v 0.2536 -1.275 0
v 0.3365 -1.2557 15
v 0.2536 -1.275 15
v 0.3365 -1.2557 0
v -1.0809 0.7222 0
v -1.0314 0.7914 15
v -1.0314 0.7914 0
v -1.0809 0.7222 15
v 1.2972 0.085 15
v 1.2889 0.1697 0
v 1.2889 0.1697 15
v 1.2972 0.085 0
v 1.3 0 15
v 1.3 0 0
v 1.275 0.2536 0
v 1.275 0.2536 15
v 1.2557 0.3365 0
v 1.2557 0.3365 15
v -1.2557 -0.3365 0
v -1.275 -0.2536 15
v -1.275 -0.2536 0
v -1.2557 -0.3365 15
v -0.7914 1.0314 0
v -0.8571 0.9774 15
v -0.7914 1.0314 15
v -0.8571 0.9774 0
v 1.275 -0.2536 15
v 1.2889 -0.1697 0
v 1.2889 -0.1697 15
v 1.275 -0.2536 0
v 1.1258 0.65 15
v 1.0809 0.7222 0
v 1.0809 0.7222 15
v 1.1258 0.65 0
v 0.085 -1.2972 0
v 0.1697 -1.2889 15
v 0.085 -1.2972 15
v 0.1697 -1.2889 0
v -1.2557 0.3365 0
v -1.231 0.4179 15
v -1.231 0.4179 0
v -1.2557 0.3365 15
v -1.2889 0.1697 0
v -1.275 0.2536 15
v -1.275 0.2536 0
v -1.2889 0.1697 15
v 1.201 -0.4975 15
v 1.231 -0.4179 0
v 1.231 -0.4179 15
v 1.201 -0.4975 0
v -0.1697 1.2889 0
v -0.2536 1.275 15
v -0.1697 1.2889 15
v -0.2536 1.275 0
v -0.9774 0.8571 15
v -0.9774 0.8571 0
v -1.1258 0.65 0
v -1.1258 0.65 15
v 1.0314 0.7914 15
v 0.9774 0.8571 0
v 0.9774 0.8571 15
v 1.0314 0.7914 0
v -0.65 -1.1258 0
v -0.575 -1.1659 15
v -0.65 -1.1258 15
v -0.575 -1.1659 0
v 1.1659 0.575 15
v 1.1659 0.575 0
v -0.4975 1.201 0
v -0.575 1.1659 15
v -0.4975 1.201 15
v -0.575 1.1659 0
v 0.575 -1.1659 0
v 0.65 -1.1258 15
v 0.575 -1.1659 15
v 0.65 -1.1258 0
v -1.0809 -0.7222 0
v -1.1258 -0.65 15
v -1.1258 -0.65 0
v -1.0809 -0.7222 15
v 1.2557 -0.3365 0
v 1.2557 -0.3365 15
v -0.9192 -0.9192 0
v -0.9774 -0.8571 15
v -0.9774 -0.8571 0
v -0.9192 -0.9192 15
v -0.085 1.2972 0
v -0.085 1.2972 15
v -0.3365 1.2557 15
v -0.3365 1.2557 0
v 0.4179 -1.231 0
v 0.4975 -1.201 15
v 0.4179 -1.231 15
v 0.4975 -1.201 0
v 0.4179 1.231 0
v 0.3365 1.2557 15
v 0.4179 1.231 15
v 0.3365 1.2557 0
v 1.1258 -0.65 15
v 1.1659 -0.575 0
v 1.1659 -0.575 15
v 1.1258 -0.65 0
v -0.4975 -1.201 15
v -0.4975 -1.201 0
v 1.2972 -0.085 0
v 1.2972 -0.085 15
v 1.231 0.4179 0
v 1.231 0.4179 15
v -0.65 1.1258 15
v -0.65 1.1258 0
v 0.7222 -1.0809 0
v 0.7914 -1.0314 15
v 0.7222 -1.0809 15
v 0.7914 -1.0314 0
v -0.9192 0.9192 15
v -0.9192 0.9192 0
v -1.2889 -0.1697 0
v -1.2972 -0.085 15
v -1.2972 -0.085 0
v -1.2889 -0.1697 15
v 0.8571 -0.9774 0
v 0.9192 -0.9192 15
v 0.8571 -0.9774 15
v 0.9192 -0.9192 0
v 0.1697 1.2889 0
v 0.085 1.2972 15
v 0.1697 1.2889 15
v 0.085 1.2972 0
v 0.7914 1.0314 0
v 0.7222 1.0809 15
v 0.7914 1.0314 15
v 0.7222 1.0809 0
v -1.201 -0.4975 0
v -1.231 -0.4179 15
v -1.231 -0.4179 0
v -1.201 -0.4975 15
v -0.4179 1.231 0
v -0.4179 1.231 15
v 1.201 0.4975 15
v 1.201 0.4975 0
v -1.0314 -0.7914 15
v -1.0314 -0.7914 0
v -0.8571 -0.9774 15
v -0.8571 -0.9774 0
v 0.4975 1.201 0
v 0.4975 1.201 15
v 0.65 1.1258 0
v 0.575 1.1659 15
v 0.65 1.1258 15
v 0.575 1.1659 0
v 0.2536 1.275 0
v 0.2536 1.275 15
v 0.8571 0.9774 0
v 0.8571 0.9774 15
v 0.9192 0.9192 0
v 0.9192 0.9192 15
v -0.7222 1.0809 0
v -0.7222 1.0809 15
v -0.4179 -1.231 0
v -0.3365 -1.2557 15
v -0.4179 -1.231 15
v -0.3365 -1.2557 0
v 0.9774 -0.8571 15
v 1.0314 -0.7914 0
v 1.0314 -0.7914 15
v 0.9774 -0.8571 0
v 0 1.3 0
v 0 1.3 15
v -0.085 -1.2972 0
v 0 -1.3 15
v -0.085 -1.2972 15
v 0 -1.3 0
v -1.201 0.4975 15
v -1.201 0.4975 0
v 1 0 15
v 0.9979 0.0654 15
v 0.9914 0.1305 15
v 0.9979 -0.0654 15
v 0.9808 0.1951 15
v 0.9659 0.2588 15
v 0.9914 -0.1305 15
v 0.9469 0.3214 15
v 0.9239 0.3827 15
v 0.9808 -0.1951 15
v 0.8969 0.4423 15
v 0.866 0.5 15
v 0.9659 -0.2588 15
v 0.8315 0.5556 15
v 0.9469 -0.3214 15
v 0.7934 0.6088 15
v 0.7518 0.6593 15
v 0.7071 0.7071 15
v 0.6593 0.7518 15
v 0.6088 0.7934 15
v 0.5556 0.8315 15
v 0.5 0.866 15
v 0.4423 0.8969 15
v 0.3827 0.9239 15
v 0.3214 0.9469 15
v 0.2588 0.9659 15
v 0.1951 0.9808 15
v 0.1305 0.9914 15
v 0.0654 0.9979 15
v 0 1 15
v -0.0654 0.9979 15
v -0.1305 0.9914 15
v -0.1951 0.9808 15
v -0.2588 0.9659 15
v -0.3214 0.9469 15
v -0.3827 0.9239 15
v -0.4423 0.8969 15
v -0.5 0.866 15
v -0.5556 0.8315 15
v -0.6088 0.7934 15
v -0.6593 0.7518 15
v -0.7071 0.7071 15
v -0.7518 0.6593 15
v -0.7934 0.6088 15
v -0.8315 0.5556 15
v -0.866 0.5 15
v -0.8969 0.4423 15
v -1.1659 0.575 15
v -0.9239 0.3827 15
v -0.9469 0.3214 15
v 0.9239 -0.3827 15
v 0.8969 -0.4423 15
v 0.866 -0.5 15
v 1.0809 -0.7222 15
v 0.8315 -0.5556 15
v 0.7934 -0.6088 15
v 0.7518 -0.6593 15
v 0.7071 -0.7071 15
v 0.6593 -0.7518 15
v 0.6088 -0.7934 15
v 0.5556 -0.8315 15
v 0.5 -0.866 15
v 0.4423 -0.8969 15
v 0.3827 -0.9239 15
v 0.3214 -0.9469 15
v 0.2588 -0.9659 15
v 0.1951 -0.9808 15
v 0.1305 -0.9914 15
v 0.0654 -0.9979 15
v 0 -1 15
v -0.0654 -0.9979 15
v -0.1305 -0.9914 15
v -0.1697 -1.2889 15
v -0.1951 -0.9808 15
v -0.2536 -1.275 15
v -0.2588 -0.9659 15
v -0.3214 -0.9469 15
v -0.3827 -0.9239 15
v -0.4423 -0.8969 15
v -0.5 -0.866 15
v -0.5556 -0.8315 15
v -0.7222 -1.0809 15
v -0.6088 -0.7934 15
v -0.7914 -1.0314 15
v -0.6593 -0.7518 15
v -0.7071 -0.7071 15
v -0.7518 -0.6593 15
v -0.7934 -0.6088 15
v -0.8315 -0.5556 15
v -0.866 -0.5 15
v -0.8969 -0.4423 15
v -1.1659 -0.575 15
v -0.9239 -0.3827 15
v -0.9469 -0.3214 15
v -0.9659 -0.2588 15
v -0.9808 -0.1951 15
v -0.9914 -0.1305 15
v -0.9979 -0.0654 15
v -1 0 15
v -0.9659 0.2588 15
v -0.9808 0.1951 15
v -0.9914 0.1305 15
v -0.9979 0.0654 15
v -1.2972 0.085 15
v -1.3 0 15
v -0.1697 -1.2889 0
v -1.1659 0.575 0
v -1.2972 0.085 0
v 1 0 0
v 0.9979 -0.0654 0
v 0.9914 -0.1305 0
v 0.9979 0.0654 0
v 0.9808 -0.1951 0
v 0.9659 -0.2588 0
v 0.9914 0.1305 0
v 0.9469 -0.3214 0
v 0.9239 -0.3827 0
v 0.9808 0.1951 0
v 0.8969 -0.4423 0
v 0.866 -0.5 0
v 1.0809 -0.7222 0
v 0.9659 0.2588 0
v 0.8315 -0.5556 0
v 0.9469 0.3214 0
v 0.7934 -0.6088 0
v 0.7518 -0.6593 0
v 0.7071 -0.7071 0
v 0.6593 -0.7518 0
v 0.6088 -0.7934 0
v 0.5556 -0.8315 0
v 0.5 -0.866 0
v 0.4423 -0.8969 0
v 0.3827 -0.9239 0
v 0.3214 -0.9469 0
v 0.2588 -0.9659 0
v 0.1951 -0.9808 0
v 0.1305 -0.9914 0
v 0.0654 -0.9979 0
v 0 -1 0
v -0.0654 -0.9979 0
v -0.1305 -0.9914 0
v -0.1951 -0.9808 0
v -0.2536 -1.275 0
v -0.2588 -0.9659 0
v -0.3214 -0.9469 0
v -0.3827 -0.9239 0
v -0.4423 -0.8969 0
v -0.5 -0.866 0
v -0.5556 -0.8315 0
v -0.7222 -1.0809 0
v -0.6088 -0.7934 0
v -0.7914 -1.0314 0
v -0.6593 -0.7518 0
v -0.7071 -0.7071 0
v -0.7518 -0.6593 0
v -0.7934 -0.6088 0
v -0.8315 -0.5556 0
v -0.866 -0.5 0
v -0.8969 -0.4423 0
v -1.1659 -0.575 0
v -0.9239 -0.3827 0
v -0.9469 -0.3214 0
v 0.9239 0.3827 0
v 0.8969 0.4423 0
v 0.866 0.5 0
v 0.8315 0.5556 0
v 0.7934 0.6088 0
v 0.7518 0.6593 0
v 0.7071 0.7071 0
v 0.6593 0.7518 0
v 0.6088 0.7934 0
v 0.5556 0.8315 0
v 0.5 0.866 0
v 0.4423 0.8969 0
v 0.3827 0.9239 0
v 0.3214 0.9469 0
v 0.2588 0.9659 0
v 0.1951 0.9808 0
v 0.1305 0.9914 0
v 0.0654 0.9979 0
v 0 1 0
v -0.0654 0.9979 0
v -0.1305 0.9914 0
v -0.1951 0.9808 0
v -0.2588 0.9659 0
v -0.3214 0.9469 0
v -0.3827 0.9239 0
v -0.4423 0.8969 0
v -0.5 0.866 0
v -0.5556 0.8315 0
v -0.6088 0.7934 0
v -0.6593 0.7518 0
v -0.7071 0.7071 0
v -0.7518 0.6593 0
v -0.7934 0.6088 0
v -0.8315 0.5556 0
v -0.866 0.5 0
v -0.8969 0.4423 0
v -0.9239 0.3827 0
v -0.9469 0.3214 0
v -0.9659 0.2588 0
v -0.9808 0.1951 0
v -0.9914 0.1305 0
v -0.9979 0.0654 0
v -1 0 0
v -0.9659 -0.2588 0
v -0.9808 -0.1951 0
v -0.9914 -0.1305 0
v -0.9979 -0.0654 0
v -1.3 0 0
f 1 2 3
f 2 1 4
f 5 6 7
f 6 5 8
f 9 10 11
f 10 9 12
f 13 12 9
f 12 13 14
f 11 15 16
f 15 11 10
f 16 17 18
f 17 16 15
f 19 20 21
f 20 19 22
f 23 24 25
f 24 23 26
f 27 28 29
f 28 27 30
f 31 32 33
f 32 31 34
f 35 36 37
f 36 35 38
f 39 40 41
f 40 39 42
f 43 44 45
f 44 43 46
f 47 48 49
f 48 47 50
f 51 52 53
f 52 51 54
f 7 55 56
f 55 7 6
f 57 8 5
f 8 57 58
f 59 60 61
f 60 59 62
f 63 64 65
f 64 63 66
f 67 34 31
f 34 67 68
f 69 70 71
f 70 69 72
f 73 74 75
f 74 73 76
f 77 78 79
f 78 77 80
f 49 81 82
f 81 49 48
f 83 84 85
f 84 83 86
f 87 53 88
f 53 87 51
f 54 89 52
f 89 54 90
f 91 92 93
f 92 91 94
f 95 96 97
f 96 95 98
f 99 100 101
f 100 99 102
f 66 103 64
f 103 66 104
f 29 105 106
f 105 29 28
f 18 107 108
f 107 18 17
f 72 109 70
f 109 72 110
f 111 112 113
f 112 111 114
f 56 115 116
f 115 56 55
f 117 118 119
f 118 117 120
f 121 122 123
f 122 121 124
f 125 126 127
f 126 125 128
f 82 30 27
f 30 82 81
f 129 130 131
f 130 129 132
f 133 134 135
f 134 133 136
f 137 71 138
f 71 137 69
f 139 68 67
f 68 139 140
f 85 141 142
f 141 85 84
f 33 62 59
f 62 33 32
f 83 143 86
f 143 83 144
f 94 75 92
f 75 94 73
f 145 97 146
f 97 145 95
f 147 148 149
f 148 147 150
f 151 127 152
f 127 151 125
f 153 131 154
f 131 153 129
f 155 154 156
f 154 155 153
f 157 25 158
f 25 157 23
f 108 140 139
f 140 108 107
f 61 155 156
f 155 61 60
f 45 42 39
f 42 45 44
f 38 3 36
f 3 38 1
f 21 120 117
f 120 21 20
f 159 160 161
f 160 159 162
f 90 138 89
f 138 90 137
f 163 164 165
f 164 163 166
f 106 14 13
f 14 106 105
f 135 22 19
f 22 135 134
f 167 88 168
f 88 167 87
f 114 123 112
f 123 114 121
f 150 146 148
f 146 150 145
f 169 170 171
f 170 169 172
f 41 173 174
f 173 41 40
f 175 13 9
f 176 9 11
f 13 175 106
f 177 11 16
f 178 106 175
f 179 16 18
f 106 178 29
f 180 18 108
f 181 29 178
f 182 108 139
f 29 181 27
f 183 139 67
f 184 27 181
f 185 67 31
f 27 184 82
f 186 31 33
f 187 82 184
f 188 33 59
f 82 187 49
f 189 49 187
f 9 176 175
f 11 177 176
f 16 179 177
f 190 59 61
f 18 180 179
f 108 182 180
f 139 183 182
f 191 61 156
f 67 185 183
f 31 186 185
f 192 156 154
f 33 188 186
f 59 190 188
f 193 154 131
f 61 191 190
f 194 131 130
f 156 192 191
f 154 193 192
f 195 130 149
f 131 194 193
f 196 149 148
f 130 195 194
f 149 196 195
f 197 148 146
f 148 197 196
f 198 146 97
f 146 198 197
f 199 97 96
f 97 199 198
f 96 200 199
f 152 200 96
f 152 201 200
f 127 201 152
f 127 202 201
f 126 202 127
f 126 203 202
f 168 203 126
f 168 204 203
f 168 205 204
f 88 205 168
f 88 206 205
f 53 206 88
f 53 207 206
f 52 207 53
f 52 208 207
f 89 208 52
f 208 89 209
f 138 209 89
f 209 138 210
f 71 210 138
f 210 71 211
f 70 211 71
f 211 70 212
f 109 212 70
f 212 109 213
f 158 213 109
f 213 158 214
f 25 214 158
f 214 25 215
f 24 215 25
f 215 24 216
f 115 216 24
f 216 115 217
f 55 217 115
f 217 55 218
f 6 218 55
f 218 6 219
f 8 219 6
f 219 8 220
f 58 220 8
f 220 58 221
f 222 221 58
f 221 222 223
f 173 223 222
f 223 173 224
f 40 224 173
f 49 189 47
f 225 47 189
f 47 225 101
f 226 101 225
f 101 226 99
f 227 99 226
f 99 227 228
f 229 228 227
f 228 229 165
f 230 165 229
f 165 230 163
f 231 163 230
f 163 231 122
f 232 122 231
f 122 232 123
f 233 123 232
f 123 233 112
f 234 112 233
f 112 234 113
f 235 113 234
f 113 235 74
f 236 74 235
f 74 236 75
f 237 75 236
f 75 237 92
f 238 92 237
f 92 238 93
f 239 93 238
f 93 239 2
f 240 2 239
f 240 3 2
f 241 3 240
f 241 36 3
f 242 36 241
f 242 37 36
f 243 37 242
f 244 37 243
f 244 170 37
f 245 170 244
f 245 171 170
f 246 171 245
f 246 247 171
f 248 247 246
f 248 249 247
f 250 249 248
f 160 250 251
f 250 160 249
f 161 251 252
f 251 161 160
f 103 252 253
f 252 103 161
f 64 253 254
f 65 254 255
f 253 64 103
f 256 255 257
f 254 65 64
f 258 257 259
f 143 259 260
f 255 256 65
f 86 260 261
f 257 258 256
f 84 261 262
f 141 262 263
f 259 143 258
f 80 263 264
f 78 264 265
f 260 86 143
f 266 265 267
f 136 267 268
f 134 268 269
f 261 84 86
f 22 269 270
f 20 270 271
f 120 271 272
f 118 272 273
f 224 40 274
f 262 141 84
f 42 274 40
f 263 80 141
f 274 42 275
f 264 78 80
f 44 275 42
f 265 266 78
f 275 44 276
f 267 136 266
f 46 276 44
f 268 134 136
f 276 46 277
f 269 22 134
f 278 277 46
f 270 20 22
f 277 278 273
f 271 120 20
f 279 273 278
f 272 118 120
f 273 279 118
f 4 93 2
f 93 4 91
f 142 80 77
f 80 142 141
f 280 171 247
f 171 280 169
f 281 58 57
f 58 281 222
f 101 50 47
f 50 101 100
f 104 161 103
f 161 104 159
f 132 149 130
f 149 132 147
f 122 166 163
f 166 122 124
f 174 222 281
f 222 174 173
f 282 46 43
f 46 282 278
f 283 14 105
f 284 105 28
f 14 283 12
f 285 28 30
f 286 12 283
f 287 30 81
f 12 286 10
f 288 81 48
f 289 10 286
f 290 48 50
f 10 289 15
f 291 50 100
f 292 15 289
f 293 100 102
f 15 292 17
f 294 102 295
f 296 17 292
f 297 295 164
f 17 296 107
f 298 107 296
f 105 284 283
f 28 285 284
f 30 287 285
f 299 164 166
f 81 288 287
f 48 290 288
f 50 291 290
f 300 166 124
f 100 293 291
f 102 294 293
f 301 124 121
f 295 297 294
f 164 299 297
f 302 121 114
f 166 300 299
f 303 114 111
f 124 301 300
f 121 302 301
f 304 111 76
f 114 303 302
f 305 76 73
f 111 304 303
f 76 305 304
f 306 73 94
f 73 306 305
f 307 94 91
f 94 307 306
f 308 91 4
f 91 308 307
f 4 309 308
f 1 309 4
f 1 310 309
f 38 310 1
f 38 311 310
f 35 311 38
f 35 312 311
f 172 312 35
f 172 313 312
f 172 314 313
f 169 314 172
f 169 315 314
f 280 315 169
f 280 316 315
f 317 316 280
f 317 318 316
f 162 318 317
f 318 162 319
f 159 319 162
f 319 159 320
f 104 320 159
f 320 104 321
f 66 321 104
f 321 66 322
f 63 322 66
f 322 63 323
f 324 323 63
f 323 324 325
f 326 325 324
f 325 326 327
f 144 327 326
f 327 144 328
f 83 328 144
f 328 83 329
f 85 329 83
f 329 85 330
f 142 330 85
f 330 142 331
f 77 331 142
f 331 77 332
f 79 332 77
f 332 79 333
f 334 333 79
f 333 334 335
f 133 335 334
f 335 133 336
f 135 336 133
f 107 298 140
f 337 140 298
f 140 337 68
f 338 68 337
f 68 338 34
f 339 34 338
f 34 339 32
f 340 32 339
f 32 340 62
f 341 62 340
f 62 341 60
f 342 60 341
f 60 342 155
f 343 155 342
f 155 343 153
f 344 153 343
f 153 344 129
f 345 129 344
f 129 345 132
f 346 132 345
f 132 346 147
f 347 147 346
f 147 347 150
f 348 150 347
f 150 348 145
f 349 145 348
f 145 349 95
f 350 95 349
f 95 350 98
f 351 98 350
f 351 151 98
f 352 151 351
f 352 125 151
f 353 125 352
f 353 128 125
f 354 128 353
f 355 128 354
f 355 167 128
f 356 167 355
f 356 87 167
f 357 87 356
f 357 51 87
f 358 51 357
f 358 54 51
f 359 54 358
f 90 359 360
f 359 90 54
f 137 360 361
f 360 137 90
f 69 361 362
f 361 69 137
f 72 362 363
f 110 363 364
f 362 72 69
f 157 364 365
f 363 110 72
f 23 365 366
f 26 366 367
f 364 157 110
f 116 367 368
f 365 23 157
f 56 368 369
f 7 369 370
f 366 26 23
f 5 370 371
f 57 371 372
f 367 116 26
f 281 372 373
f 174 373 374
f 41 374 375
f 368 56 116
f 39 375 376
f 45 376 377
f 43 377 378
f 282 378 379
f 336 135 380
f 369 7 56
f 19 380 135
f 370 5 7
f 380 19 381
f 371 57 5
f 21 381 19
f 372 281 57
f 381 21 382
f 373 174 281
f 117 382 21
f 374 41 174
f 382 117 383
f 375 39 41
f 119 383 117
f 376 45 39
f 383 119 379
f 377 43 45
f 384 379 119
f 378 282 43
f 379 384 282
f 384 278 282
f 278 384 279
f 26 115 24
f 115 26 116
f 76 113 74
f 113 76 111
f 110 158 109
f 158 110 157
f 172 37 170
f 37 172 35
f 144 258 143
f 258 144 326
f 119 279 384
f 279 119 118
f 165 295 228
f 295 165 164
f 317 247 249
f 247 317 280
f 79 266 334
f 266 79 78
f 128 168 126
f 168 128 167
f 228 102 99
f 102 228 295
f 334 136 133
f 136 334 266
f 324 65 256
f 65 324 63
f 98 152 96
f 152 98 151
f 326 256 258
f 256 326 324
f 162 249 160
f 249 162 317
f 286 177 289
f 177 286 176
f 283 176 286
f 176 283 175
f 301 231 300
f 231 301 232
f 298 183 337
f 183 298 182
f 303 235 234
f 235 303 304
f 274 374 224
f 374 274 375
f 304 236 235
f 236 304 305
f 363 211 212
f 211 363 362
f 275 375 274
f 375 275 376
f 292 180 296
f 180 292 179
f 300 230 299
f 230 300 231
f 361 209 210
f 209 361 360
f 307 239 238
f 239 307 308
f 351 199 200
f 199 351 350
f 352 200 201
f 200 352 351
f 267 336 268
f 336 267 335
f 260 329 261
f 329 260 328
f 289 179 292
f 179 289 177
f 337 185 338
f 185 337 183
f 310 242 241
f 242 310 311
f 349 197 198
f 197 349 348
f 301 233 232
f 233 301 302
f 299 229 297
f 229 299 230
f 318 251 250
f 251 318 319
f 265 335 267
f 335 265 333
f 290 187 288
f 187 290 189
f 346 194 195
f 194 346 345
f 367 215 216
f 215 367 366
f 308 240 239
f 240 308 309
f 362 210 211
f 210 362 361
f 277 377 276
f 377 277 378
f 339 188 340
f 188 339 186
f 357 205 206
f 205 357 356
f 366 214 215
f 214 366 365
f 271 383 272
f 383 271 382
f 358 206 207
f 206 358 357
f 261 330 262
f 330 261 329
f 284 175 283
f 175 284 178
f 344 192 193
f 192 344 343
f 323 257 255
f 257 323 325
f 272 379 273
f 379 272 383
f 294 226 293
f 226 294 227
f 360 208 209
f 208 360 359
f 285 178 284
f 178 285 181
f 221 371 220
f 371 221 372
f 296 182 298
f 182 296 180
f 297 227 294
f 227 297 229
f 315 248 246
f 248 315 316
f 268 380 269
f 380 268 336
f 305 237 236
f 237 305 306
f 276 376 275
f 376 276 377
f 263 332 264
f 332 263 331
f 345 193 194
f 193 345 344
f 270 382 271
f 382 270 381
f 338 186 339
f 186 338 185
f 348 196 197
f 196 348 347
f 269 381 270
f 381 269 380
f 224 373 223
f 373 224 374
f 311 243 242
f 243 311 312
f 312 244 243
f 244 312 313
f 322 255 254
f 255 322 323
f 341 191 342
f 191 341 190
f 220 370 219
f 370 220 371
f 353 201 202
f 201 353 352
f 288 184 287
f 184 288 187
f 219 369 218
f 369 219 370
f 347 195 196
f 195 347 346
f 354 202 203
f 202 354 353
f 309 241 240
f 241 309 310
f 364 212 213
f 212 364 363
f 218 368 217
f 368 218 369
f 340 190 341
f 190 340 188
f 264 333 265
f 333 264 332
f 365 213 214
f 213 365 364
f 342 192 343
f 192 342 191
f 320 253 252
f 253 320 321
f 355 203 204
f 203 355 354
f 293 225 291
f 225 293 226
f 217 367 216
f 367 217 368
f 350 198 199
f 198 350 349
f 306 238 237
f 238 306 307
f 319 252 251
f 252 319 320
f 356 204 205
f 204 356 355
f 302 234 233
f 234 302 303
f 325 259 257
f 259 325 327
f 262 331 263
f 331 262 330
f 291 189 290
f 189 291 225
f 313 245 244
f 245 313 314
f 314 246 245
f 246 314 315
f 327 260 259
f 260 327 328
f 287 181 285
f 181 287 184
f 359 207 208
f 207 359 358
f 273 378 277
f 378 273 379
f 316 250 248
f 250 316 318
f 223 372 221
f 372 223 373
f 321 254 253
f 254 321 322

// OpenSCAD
// PTFE heatshrink sleeving (standalone hollow tube)

// Parameters
length = 15; //[8:30:1]
center = 1; //[0:1:1]
forced_id = 0; //[0:10:1]
tubing_id = 2; //[1:6:0.5]
wall_thickness = 0.3; //[0.15:0.8:0.05]
eps = 0.2; //[0.1:0.5:0.05]

$fn = 96;

id = (forced_id > 0) ? forced_id : tubing_id;
ir = id/2;
or = ir + wall_thickness;

module ptfe_heatshrink_sleeving() {
  color([0.85, 0.85, 0.8])
  difference() {
    cylinder(r=or, h=length, center=center);
    // Inner void slightly extended to guarantee a clean through-hole
    translate([0, 0, center ? 0 : -eps])
      cylinder(r=ir, h=length + 2*eps, center=center);
  }
}

ptfe_heatshrink_sleeving();
